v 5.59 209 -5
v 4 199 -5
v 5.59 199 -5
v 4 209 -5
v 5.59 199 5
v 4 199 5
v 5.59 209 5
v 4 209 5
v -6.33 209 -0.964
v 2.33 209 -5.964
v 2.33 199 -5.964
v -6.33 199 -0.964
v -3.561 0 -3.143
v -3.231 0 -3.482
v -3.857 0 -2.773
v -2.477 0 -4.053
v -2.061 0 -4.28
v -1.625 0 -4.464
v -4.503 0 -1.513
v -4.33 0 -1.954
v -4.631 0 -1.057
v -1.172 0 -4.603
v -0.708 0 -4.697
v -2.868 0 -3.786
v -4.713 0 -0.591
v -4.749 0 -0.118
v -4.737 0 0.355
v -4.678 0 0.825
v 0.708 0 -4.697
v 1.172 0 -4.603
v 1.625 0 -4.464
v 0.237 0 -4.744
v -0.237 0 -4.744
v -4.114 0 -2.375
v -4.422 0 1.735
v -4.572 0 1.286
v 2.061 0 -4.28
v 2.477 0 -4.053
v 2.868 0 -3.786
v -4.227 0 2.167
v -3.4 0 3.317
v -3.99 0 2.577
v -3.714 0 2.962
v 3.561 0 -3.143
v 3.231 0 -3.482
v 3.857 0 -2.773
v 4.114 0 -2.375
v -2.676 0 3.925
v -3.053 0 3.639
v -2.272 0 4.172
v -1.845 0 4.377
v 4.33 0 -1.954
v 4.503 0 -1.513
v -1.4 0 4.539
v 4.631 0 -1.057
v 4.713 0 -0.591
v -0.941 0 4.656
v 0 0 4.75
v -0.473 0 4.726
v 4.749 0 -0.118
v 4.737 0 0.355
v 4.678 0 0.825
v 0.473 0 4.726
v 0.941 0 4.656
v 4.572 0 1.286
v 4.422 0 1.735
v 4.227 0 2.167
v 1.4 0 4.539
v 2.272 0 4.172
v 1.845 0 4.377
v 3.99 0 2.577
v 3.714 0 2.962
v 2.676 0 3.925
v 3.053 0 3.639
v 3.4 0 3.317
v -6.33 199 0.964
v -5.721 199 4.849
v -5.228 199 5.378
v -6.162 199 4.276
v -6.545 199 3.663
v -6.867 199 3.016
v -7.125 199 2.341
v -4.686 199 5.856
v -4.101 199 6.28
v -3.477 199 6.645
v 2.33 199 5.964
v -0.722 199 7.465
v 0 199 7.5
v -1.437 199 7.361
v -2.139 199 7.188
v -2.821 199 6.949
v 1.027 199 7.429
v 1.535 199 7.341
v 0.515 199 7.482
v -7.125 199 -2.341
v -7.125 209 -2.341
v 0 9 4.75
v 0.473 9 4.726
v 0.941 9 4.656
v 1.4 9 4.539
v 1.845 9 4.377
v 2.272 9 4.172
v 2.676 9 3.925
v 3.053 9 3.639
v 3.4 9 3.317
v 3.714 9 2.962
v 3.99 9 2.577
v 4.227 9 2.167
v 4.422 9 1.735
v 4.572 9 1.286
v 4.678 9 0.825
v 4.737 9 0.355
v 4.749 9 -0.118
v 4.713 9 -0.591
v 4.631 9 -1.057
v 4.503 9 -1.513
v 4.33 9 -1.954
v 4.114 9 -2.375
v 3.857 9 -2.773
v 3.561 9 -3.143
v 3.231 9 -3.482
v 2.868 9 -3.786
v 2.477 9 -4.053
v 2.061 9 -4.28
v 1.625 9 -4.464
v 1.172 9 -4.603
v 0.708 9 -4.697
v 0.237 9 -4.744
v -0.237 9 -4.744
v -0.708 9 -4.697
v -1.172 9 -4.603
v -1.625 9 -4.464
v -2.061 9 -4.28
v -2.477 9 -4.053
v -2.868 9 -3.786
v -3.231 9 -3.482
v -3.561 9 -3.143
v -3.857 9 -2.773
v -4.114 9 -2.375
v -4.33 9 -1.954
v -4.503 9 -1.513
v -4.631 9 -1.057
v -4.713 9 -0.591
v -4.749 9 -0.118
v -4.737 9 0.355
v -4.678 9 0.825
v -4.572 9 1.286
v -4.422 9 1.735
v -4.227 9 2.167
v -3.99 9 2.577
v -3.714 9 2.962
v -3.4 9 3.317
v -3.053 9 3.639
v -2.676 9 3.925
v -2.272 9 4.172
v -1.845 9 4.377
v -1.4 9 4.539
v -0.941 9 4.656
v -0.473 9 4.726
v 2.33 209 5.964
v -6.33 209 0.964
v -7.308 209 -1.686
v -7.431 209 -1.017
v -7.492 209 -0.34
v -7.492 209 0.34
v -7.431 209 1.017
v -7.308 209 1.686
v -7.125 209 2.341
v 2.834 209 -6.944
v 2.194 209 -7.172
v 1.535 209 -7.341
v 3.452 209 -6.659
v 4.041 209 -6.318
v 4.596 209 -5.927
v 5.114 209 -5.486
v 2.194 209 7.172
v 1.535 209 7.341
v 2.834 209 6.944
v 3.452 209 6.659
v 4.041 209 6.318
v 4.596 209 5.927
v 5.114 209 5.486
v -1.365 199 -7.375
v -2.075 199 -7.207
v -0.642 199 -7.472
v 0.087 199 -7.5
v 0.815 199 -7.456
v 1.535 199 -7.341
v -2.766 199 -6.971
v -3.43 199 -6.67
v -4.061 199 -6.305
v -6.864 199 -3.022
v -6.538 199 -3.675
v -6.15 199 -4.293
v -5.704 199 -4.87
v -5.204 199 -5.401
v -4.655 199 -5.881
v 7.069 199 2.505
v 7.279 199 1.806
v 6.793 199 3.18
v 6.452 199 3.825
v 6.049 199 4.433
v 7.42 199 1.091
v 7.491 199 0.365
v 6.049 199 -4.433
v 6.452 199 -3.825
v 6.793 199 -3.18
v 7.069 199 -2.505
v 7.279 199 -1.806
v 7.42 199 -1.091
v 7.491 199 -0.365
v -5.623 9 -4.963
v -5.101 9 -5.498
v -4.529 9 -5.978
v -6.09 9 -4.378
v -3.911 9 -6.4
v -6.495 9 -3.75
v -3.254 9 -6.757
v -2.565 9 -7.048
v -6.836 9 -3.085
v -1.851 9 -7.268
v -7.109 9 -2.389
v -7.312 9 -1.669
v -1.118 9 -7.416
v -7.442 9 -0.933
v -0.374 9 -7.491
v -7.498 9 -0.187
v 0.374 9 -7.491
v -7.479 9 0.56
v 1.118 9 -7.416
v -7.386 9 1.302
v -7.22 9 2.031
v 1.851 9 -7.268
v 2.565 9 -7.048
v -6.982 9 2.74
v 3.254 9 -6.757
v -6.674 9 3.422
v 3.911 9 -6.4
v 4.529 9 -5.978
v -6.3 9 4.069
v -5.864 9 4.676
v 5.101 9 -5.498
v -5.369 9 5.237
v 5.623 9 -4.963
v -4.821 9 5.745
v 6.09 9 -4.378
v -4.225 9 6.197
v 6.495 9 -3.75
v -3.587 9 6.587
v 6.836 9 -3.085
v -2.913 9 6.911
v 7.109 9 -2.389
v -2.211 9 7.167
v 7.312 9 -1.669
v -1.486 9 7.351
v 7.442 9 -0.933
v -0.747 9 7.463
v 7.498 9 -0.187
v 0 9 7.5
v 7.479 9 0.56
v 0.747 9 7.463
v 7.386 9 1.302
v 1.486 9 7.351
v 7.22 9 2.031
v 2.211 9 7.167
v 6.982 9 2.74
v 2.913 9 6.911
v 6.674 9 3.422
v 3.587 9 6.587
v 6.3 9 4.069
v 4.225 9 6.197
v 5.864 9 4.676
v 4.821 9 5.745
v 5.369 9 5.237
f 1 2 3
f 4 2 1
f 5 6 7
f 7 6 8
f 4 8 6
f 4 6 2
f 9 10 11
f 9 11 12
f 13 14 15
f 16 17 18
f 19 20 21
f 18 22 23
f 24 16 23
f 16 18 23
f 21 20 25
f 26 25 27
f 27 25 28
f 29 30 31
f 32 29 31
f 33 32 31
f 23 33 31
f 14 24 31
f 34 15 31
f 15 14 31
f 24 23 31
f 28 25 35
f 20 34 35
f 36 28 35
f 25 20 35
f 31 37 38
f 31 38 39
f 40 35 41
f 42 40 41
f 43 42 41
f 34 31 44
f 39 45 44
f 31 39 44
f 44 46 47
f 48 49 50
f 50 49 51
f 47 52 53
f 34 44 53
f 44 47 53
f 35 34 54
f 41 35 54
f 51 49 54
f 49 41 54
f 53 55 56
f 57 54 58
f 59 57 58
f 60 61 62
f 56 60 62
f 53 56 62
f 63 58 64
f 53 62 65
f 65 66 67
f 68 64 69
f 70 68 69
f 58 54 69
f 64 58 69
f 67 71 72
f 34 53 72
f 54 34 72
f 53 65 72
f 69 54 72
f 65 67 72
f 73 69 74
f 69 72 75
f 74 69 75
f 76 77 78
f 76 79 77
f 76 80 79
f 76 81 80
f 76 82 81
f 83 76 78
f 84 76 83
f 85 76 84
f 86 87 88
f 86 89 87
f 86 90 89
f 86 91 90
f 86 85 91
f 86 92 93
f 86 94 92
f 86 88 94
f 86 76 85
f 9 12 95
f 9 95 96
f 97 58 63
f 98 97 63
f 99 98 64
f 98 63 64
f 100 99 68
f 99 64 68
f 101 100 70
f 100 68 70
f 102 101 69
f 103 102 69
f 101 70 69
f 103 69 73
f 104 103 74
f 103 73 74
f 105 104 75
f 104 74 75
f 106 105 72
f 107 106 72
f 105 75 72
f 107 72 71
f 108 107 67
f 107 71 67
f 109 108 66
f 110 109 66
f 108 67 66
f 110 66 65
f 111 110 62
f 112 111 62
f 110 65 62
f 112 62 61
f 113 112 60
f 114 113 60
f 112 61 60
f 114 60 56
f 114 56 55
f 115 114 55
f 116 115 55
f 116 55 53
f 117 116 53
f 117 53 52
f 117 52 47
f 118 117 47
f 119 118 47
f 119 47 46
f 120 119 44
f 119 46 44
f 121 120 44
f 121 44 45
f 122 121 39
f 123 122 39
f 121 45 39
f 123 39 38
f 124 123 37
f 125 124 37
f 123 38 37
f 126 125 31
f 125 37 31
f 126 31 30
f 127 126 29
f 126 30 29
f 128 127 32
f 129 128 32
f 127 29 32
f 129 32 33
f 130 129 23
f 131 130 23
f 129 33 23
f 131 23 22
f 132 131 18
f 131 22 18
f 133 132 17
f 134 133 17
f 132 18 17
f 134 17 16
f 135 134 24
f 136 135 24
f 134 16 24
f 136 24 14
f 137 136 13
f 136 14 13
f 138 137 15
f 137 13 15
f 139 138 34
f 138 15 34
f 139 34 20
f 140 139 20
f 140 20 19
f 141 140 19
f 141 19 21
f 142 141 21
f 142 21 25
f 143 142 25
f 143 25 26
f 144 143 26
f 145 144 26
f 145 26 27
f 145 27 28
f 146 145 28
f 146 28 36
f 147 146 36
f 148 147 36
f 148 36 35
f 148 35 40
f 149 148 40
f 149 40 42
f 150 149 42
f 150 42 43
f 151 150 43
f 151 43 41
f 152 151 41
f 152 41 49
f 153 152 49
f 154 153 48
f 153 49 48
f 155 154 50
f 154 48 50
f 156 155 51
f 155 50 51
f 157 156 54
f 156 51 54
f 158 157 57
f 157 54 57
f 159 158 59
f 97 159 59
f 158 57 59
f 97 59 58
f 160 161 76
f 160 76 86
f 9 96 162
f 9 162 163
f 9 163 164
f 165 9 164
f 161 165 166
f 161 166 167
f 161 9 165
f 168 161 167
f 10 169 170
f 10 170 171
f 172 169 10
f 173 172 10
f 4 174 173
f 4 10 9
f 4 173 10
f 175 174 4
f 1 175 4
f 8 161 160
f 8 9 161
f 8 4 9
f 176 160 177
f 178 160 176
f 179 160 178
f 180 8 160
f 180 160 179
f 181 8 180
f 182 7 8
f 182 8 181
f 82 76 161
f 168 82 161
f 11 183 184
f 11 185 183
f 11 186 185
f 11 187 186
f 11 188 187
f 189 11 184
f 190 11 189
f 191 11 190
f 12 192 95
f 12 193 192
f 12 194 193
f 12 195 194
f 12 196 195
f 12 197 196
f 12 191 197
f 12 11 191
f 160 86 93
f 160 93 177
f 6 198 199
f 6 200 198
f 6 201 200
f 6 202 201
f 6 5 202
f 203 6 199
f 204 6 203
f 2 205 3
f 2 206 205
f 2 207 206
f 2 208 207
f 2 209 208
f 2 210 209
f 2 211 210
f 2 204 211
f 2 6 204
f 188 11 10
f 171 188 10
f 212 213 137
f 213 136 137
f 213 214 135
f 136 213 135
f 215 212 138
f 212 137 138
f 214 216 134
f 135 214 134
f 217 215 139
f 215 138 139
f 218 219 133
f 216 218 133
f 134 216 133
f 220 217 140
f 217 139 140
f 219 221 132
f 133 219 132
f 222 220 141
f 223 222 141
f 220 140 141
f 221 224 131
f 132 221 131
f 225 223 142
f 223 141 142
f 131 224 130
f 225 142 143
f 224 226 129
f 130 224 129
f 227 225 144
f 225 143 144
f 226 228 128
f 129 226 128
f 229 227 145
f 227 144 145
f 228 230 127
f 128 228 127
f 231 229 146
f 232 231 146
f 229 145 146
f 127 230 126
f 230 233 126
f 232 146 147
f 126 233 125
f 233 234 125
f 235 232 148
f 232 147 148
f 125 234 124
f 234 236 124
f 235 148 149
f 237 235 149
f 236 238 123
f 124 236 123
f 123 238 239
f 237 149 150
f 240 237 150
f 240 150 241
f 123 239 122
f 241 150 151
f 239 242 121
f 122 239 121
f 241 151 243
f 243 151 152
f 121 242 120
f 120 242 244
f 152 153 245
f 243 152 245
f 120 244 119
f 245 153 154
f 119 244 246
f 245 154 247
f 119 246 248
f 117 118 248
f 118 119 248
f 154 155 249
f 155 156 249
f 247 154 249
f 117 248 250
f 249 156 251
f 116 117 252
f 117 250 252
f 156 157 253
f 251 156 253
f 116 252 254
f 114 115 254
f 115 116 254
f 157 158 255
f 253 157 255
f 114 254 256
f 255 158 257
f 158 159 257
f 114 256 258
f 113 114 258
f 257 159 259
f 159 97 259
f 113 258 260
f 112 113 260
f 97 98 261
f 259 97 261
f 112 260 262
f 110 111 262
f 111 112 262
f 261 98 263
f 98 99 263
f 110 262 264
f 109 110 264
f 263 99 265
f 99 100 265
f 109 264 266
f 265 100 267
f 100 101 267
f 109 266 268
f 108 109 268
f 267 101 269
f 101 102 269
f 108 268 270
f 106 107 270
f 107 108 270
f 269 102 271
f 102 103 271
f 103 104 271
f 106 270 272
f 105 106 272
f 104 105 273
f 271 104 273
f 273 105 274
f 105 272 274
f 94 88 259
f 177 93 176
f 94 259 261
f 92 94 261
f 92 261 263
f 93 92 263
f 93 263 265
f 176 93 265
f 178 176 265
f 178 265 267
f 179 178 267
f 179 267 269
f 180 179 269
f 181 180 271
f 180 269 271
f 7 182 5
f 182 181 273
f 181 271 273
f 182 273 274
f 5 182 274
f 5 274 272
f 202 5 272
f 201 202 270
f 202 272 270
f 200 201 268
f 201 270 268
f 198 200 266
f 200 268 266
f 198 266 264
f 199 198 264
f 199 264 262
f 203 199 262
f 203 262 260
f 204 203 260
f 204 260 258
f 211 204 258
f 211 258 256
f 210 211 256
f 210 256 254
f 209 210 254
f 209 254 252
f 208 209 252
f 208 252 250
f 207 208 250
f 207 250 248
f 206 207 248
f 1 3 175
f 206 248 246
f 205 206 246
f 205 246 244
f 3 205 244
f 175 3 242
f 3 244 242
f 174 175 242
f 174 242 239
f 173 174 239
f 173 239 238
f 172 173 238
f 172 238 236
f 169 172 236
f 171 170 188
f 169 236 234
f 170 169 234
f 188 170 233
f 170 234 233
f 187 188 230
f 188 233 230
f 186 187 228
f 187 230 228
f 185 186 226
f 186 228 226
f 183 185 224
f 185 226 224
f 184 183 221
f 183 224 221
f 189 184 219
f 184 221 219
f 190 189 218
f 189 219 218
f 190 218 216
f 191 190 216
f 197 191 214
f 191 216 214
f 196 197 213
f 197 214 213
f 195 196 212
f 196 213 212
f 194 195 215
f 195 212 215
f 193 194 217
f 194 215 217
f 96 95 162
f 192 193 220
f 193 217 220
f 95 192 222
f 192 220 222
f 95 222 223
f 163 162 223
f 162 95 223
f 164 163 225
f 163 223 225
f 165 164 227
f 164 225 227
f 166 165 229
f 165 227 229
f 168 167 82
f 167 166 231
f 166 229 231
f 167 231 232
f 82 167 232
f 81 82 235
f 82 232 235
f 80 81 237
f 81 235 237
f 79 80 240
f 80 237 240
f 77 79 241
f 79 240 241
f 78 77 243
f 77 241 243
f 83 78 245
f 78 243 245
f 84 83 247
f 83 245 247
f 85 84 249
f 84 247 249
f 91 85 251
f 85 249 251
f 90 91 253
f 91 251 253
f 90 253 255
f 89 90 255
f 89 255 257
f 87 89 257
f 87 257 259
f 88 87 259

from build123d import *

# Parameters (mm, degrees)
SKETCH1_R           = 4.75
BOSS_EXTRUDE1_DEPTH = 9
SKETCH2_R           = 7.5
BOSS_EXTRUDE2_DEPTH = 200
CUT_EXTRUDE1_START  = 4
SKETCH3_W           = 10
SKETCH3_H           = 10
CUT_EXTRUDE1_DEPTH  = 206.268965688
CIRPATTERN2_COUNT   = 3


with BuildPart() as part:
    # Sketch1 → Boss-Extrude1 (new body)
    with BuildSketch(Plane(origin=(0, 0, 0), x_dir=(1, 0, 0), z_dir=(0, 1, 0))):
        with Locations(Location((0, 0, 0), (0, 0, 270))):
            Circle(SKETCH1_R)
    extrude(amount=BOSS_EXTRUDE1_DEPTH)

    # Sketch2 → Boss-Extrude2 (add)
    with BuildSketch(Plane(origin=(0, 9, 0), x_dir=(1, 0, 0), z_dir=(0, 1, 0))):
        with Locations(Location((0, 0, 0), (0, 0, 270))):
            Circle(SKETCH2_R)
    extrude(amount=BOSS_EXTRUDE2_DEPTH)

    # Sketch3 → Cut-Extrude1 (cut, through all)
    with BuildSketch(Plane(origin=(0, 0, 0), x_dir=(0, 0, -1), z_dir=(1, 0, 0)).offset(CUT_EXTRUDE1_START)):
        with Locations((0, 204)):
            Rectangle(SKETCH3_W, SKETCH3_H)
    cut_extrude1 = extrude(amount=CUT_EXTRUDE1_DEPTH, mode=Mode.SUBTRACT)

    # CirPattern2: Cut-Extrude1 ×3 about axis
    cirpattern2_axis = Axis((0, 0, 0), (0, 1, 0))
    for i in range(1, CIRPATTERN2_COUNT):
        add(cut_extrude1.rotate(cirpattern2_axis, i * 360 / CIRPATTERN2_COUNT), mode=Mode.SUBTRACT)


solid = part.part
